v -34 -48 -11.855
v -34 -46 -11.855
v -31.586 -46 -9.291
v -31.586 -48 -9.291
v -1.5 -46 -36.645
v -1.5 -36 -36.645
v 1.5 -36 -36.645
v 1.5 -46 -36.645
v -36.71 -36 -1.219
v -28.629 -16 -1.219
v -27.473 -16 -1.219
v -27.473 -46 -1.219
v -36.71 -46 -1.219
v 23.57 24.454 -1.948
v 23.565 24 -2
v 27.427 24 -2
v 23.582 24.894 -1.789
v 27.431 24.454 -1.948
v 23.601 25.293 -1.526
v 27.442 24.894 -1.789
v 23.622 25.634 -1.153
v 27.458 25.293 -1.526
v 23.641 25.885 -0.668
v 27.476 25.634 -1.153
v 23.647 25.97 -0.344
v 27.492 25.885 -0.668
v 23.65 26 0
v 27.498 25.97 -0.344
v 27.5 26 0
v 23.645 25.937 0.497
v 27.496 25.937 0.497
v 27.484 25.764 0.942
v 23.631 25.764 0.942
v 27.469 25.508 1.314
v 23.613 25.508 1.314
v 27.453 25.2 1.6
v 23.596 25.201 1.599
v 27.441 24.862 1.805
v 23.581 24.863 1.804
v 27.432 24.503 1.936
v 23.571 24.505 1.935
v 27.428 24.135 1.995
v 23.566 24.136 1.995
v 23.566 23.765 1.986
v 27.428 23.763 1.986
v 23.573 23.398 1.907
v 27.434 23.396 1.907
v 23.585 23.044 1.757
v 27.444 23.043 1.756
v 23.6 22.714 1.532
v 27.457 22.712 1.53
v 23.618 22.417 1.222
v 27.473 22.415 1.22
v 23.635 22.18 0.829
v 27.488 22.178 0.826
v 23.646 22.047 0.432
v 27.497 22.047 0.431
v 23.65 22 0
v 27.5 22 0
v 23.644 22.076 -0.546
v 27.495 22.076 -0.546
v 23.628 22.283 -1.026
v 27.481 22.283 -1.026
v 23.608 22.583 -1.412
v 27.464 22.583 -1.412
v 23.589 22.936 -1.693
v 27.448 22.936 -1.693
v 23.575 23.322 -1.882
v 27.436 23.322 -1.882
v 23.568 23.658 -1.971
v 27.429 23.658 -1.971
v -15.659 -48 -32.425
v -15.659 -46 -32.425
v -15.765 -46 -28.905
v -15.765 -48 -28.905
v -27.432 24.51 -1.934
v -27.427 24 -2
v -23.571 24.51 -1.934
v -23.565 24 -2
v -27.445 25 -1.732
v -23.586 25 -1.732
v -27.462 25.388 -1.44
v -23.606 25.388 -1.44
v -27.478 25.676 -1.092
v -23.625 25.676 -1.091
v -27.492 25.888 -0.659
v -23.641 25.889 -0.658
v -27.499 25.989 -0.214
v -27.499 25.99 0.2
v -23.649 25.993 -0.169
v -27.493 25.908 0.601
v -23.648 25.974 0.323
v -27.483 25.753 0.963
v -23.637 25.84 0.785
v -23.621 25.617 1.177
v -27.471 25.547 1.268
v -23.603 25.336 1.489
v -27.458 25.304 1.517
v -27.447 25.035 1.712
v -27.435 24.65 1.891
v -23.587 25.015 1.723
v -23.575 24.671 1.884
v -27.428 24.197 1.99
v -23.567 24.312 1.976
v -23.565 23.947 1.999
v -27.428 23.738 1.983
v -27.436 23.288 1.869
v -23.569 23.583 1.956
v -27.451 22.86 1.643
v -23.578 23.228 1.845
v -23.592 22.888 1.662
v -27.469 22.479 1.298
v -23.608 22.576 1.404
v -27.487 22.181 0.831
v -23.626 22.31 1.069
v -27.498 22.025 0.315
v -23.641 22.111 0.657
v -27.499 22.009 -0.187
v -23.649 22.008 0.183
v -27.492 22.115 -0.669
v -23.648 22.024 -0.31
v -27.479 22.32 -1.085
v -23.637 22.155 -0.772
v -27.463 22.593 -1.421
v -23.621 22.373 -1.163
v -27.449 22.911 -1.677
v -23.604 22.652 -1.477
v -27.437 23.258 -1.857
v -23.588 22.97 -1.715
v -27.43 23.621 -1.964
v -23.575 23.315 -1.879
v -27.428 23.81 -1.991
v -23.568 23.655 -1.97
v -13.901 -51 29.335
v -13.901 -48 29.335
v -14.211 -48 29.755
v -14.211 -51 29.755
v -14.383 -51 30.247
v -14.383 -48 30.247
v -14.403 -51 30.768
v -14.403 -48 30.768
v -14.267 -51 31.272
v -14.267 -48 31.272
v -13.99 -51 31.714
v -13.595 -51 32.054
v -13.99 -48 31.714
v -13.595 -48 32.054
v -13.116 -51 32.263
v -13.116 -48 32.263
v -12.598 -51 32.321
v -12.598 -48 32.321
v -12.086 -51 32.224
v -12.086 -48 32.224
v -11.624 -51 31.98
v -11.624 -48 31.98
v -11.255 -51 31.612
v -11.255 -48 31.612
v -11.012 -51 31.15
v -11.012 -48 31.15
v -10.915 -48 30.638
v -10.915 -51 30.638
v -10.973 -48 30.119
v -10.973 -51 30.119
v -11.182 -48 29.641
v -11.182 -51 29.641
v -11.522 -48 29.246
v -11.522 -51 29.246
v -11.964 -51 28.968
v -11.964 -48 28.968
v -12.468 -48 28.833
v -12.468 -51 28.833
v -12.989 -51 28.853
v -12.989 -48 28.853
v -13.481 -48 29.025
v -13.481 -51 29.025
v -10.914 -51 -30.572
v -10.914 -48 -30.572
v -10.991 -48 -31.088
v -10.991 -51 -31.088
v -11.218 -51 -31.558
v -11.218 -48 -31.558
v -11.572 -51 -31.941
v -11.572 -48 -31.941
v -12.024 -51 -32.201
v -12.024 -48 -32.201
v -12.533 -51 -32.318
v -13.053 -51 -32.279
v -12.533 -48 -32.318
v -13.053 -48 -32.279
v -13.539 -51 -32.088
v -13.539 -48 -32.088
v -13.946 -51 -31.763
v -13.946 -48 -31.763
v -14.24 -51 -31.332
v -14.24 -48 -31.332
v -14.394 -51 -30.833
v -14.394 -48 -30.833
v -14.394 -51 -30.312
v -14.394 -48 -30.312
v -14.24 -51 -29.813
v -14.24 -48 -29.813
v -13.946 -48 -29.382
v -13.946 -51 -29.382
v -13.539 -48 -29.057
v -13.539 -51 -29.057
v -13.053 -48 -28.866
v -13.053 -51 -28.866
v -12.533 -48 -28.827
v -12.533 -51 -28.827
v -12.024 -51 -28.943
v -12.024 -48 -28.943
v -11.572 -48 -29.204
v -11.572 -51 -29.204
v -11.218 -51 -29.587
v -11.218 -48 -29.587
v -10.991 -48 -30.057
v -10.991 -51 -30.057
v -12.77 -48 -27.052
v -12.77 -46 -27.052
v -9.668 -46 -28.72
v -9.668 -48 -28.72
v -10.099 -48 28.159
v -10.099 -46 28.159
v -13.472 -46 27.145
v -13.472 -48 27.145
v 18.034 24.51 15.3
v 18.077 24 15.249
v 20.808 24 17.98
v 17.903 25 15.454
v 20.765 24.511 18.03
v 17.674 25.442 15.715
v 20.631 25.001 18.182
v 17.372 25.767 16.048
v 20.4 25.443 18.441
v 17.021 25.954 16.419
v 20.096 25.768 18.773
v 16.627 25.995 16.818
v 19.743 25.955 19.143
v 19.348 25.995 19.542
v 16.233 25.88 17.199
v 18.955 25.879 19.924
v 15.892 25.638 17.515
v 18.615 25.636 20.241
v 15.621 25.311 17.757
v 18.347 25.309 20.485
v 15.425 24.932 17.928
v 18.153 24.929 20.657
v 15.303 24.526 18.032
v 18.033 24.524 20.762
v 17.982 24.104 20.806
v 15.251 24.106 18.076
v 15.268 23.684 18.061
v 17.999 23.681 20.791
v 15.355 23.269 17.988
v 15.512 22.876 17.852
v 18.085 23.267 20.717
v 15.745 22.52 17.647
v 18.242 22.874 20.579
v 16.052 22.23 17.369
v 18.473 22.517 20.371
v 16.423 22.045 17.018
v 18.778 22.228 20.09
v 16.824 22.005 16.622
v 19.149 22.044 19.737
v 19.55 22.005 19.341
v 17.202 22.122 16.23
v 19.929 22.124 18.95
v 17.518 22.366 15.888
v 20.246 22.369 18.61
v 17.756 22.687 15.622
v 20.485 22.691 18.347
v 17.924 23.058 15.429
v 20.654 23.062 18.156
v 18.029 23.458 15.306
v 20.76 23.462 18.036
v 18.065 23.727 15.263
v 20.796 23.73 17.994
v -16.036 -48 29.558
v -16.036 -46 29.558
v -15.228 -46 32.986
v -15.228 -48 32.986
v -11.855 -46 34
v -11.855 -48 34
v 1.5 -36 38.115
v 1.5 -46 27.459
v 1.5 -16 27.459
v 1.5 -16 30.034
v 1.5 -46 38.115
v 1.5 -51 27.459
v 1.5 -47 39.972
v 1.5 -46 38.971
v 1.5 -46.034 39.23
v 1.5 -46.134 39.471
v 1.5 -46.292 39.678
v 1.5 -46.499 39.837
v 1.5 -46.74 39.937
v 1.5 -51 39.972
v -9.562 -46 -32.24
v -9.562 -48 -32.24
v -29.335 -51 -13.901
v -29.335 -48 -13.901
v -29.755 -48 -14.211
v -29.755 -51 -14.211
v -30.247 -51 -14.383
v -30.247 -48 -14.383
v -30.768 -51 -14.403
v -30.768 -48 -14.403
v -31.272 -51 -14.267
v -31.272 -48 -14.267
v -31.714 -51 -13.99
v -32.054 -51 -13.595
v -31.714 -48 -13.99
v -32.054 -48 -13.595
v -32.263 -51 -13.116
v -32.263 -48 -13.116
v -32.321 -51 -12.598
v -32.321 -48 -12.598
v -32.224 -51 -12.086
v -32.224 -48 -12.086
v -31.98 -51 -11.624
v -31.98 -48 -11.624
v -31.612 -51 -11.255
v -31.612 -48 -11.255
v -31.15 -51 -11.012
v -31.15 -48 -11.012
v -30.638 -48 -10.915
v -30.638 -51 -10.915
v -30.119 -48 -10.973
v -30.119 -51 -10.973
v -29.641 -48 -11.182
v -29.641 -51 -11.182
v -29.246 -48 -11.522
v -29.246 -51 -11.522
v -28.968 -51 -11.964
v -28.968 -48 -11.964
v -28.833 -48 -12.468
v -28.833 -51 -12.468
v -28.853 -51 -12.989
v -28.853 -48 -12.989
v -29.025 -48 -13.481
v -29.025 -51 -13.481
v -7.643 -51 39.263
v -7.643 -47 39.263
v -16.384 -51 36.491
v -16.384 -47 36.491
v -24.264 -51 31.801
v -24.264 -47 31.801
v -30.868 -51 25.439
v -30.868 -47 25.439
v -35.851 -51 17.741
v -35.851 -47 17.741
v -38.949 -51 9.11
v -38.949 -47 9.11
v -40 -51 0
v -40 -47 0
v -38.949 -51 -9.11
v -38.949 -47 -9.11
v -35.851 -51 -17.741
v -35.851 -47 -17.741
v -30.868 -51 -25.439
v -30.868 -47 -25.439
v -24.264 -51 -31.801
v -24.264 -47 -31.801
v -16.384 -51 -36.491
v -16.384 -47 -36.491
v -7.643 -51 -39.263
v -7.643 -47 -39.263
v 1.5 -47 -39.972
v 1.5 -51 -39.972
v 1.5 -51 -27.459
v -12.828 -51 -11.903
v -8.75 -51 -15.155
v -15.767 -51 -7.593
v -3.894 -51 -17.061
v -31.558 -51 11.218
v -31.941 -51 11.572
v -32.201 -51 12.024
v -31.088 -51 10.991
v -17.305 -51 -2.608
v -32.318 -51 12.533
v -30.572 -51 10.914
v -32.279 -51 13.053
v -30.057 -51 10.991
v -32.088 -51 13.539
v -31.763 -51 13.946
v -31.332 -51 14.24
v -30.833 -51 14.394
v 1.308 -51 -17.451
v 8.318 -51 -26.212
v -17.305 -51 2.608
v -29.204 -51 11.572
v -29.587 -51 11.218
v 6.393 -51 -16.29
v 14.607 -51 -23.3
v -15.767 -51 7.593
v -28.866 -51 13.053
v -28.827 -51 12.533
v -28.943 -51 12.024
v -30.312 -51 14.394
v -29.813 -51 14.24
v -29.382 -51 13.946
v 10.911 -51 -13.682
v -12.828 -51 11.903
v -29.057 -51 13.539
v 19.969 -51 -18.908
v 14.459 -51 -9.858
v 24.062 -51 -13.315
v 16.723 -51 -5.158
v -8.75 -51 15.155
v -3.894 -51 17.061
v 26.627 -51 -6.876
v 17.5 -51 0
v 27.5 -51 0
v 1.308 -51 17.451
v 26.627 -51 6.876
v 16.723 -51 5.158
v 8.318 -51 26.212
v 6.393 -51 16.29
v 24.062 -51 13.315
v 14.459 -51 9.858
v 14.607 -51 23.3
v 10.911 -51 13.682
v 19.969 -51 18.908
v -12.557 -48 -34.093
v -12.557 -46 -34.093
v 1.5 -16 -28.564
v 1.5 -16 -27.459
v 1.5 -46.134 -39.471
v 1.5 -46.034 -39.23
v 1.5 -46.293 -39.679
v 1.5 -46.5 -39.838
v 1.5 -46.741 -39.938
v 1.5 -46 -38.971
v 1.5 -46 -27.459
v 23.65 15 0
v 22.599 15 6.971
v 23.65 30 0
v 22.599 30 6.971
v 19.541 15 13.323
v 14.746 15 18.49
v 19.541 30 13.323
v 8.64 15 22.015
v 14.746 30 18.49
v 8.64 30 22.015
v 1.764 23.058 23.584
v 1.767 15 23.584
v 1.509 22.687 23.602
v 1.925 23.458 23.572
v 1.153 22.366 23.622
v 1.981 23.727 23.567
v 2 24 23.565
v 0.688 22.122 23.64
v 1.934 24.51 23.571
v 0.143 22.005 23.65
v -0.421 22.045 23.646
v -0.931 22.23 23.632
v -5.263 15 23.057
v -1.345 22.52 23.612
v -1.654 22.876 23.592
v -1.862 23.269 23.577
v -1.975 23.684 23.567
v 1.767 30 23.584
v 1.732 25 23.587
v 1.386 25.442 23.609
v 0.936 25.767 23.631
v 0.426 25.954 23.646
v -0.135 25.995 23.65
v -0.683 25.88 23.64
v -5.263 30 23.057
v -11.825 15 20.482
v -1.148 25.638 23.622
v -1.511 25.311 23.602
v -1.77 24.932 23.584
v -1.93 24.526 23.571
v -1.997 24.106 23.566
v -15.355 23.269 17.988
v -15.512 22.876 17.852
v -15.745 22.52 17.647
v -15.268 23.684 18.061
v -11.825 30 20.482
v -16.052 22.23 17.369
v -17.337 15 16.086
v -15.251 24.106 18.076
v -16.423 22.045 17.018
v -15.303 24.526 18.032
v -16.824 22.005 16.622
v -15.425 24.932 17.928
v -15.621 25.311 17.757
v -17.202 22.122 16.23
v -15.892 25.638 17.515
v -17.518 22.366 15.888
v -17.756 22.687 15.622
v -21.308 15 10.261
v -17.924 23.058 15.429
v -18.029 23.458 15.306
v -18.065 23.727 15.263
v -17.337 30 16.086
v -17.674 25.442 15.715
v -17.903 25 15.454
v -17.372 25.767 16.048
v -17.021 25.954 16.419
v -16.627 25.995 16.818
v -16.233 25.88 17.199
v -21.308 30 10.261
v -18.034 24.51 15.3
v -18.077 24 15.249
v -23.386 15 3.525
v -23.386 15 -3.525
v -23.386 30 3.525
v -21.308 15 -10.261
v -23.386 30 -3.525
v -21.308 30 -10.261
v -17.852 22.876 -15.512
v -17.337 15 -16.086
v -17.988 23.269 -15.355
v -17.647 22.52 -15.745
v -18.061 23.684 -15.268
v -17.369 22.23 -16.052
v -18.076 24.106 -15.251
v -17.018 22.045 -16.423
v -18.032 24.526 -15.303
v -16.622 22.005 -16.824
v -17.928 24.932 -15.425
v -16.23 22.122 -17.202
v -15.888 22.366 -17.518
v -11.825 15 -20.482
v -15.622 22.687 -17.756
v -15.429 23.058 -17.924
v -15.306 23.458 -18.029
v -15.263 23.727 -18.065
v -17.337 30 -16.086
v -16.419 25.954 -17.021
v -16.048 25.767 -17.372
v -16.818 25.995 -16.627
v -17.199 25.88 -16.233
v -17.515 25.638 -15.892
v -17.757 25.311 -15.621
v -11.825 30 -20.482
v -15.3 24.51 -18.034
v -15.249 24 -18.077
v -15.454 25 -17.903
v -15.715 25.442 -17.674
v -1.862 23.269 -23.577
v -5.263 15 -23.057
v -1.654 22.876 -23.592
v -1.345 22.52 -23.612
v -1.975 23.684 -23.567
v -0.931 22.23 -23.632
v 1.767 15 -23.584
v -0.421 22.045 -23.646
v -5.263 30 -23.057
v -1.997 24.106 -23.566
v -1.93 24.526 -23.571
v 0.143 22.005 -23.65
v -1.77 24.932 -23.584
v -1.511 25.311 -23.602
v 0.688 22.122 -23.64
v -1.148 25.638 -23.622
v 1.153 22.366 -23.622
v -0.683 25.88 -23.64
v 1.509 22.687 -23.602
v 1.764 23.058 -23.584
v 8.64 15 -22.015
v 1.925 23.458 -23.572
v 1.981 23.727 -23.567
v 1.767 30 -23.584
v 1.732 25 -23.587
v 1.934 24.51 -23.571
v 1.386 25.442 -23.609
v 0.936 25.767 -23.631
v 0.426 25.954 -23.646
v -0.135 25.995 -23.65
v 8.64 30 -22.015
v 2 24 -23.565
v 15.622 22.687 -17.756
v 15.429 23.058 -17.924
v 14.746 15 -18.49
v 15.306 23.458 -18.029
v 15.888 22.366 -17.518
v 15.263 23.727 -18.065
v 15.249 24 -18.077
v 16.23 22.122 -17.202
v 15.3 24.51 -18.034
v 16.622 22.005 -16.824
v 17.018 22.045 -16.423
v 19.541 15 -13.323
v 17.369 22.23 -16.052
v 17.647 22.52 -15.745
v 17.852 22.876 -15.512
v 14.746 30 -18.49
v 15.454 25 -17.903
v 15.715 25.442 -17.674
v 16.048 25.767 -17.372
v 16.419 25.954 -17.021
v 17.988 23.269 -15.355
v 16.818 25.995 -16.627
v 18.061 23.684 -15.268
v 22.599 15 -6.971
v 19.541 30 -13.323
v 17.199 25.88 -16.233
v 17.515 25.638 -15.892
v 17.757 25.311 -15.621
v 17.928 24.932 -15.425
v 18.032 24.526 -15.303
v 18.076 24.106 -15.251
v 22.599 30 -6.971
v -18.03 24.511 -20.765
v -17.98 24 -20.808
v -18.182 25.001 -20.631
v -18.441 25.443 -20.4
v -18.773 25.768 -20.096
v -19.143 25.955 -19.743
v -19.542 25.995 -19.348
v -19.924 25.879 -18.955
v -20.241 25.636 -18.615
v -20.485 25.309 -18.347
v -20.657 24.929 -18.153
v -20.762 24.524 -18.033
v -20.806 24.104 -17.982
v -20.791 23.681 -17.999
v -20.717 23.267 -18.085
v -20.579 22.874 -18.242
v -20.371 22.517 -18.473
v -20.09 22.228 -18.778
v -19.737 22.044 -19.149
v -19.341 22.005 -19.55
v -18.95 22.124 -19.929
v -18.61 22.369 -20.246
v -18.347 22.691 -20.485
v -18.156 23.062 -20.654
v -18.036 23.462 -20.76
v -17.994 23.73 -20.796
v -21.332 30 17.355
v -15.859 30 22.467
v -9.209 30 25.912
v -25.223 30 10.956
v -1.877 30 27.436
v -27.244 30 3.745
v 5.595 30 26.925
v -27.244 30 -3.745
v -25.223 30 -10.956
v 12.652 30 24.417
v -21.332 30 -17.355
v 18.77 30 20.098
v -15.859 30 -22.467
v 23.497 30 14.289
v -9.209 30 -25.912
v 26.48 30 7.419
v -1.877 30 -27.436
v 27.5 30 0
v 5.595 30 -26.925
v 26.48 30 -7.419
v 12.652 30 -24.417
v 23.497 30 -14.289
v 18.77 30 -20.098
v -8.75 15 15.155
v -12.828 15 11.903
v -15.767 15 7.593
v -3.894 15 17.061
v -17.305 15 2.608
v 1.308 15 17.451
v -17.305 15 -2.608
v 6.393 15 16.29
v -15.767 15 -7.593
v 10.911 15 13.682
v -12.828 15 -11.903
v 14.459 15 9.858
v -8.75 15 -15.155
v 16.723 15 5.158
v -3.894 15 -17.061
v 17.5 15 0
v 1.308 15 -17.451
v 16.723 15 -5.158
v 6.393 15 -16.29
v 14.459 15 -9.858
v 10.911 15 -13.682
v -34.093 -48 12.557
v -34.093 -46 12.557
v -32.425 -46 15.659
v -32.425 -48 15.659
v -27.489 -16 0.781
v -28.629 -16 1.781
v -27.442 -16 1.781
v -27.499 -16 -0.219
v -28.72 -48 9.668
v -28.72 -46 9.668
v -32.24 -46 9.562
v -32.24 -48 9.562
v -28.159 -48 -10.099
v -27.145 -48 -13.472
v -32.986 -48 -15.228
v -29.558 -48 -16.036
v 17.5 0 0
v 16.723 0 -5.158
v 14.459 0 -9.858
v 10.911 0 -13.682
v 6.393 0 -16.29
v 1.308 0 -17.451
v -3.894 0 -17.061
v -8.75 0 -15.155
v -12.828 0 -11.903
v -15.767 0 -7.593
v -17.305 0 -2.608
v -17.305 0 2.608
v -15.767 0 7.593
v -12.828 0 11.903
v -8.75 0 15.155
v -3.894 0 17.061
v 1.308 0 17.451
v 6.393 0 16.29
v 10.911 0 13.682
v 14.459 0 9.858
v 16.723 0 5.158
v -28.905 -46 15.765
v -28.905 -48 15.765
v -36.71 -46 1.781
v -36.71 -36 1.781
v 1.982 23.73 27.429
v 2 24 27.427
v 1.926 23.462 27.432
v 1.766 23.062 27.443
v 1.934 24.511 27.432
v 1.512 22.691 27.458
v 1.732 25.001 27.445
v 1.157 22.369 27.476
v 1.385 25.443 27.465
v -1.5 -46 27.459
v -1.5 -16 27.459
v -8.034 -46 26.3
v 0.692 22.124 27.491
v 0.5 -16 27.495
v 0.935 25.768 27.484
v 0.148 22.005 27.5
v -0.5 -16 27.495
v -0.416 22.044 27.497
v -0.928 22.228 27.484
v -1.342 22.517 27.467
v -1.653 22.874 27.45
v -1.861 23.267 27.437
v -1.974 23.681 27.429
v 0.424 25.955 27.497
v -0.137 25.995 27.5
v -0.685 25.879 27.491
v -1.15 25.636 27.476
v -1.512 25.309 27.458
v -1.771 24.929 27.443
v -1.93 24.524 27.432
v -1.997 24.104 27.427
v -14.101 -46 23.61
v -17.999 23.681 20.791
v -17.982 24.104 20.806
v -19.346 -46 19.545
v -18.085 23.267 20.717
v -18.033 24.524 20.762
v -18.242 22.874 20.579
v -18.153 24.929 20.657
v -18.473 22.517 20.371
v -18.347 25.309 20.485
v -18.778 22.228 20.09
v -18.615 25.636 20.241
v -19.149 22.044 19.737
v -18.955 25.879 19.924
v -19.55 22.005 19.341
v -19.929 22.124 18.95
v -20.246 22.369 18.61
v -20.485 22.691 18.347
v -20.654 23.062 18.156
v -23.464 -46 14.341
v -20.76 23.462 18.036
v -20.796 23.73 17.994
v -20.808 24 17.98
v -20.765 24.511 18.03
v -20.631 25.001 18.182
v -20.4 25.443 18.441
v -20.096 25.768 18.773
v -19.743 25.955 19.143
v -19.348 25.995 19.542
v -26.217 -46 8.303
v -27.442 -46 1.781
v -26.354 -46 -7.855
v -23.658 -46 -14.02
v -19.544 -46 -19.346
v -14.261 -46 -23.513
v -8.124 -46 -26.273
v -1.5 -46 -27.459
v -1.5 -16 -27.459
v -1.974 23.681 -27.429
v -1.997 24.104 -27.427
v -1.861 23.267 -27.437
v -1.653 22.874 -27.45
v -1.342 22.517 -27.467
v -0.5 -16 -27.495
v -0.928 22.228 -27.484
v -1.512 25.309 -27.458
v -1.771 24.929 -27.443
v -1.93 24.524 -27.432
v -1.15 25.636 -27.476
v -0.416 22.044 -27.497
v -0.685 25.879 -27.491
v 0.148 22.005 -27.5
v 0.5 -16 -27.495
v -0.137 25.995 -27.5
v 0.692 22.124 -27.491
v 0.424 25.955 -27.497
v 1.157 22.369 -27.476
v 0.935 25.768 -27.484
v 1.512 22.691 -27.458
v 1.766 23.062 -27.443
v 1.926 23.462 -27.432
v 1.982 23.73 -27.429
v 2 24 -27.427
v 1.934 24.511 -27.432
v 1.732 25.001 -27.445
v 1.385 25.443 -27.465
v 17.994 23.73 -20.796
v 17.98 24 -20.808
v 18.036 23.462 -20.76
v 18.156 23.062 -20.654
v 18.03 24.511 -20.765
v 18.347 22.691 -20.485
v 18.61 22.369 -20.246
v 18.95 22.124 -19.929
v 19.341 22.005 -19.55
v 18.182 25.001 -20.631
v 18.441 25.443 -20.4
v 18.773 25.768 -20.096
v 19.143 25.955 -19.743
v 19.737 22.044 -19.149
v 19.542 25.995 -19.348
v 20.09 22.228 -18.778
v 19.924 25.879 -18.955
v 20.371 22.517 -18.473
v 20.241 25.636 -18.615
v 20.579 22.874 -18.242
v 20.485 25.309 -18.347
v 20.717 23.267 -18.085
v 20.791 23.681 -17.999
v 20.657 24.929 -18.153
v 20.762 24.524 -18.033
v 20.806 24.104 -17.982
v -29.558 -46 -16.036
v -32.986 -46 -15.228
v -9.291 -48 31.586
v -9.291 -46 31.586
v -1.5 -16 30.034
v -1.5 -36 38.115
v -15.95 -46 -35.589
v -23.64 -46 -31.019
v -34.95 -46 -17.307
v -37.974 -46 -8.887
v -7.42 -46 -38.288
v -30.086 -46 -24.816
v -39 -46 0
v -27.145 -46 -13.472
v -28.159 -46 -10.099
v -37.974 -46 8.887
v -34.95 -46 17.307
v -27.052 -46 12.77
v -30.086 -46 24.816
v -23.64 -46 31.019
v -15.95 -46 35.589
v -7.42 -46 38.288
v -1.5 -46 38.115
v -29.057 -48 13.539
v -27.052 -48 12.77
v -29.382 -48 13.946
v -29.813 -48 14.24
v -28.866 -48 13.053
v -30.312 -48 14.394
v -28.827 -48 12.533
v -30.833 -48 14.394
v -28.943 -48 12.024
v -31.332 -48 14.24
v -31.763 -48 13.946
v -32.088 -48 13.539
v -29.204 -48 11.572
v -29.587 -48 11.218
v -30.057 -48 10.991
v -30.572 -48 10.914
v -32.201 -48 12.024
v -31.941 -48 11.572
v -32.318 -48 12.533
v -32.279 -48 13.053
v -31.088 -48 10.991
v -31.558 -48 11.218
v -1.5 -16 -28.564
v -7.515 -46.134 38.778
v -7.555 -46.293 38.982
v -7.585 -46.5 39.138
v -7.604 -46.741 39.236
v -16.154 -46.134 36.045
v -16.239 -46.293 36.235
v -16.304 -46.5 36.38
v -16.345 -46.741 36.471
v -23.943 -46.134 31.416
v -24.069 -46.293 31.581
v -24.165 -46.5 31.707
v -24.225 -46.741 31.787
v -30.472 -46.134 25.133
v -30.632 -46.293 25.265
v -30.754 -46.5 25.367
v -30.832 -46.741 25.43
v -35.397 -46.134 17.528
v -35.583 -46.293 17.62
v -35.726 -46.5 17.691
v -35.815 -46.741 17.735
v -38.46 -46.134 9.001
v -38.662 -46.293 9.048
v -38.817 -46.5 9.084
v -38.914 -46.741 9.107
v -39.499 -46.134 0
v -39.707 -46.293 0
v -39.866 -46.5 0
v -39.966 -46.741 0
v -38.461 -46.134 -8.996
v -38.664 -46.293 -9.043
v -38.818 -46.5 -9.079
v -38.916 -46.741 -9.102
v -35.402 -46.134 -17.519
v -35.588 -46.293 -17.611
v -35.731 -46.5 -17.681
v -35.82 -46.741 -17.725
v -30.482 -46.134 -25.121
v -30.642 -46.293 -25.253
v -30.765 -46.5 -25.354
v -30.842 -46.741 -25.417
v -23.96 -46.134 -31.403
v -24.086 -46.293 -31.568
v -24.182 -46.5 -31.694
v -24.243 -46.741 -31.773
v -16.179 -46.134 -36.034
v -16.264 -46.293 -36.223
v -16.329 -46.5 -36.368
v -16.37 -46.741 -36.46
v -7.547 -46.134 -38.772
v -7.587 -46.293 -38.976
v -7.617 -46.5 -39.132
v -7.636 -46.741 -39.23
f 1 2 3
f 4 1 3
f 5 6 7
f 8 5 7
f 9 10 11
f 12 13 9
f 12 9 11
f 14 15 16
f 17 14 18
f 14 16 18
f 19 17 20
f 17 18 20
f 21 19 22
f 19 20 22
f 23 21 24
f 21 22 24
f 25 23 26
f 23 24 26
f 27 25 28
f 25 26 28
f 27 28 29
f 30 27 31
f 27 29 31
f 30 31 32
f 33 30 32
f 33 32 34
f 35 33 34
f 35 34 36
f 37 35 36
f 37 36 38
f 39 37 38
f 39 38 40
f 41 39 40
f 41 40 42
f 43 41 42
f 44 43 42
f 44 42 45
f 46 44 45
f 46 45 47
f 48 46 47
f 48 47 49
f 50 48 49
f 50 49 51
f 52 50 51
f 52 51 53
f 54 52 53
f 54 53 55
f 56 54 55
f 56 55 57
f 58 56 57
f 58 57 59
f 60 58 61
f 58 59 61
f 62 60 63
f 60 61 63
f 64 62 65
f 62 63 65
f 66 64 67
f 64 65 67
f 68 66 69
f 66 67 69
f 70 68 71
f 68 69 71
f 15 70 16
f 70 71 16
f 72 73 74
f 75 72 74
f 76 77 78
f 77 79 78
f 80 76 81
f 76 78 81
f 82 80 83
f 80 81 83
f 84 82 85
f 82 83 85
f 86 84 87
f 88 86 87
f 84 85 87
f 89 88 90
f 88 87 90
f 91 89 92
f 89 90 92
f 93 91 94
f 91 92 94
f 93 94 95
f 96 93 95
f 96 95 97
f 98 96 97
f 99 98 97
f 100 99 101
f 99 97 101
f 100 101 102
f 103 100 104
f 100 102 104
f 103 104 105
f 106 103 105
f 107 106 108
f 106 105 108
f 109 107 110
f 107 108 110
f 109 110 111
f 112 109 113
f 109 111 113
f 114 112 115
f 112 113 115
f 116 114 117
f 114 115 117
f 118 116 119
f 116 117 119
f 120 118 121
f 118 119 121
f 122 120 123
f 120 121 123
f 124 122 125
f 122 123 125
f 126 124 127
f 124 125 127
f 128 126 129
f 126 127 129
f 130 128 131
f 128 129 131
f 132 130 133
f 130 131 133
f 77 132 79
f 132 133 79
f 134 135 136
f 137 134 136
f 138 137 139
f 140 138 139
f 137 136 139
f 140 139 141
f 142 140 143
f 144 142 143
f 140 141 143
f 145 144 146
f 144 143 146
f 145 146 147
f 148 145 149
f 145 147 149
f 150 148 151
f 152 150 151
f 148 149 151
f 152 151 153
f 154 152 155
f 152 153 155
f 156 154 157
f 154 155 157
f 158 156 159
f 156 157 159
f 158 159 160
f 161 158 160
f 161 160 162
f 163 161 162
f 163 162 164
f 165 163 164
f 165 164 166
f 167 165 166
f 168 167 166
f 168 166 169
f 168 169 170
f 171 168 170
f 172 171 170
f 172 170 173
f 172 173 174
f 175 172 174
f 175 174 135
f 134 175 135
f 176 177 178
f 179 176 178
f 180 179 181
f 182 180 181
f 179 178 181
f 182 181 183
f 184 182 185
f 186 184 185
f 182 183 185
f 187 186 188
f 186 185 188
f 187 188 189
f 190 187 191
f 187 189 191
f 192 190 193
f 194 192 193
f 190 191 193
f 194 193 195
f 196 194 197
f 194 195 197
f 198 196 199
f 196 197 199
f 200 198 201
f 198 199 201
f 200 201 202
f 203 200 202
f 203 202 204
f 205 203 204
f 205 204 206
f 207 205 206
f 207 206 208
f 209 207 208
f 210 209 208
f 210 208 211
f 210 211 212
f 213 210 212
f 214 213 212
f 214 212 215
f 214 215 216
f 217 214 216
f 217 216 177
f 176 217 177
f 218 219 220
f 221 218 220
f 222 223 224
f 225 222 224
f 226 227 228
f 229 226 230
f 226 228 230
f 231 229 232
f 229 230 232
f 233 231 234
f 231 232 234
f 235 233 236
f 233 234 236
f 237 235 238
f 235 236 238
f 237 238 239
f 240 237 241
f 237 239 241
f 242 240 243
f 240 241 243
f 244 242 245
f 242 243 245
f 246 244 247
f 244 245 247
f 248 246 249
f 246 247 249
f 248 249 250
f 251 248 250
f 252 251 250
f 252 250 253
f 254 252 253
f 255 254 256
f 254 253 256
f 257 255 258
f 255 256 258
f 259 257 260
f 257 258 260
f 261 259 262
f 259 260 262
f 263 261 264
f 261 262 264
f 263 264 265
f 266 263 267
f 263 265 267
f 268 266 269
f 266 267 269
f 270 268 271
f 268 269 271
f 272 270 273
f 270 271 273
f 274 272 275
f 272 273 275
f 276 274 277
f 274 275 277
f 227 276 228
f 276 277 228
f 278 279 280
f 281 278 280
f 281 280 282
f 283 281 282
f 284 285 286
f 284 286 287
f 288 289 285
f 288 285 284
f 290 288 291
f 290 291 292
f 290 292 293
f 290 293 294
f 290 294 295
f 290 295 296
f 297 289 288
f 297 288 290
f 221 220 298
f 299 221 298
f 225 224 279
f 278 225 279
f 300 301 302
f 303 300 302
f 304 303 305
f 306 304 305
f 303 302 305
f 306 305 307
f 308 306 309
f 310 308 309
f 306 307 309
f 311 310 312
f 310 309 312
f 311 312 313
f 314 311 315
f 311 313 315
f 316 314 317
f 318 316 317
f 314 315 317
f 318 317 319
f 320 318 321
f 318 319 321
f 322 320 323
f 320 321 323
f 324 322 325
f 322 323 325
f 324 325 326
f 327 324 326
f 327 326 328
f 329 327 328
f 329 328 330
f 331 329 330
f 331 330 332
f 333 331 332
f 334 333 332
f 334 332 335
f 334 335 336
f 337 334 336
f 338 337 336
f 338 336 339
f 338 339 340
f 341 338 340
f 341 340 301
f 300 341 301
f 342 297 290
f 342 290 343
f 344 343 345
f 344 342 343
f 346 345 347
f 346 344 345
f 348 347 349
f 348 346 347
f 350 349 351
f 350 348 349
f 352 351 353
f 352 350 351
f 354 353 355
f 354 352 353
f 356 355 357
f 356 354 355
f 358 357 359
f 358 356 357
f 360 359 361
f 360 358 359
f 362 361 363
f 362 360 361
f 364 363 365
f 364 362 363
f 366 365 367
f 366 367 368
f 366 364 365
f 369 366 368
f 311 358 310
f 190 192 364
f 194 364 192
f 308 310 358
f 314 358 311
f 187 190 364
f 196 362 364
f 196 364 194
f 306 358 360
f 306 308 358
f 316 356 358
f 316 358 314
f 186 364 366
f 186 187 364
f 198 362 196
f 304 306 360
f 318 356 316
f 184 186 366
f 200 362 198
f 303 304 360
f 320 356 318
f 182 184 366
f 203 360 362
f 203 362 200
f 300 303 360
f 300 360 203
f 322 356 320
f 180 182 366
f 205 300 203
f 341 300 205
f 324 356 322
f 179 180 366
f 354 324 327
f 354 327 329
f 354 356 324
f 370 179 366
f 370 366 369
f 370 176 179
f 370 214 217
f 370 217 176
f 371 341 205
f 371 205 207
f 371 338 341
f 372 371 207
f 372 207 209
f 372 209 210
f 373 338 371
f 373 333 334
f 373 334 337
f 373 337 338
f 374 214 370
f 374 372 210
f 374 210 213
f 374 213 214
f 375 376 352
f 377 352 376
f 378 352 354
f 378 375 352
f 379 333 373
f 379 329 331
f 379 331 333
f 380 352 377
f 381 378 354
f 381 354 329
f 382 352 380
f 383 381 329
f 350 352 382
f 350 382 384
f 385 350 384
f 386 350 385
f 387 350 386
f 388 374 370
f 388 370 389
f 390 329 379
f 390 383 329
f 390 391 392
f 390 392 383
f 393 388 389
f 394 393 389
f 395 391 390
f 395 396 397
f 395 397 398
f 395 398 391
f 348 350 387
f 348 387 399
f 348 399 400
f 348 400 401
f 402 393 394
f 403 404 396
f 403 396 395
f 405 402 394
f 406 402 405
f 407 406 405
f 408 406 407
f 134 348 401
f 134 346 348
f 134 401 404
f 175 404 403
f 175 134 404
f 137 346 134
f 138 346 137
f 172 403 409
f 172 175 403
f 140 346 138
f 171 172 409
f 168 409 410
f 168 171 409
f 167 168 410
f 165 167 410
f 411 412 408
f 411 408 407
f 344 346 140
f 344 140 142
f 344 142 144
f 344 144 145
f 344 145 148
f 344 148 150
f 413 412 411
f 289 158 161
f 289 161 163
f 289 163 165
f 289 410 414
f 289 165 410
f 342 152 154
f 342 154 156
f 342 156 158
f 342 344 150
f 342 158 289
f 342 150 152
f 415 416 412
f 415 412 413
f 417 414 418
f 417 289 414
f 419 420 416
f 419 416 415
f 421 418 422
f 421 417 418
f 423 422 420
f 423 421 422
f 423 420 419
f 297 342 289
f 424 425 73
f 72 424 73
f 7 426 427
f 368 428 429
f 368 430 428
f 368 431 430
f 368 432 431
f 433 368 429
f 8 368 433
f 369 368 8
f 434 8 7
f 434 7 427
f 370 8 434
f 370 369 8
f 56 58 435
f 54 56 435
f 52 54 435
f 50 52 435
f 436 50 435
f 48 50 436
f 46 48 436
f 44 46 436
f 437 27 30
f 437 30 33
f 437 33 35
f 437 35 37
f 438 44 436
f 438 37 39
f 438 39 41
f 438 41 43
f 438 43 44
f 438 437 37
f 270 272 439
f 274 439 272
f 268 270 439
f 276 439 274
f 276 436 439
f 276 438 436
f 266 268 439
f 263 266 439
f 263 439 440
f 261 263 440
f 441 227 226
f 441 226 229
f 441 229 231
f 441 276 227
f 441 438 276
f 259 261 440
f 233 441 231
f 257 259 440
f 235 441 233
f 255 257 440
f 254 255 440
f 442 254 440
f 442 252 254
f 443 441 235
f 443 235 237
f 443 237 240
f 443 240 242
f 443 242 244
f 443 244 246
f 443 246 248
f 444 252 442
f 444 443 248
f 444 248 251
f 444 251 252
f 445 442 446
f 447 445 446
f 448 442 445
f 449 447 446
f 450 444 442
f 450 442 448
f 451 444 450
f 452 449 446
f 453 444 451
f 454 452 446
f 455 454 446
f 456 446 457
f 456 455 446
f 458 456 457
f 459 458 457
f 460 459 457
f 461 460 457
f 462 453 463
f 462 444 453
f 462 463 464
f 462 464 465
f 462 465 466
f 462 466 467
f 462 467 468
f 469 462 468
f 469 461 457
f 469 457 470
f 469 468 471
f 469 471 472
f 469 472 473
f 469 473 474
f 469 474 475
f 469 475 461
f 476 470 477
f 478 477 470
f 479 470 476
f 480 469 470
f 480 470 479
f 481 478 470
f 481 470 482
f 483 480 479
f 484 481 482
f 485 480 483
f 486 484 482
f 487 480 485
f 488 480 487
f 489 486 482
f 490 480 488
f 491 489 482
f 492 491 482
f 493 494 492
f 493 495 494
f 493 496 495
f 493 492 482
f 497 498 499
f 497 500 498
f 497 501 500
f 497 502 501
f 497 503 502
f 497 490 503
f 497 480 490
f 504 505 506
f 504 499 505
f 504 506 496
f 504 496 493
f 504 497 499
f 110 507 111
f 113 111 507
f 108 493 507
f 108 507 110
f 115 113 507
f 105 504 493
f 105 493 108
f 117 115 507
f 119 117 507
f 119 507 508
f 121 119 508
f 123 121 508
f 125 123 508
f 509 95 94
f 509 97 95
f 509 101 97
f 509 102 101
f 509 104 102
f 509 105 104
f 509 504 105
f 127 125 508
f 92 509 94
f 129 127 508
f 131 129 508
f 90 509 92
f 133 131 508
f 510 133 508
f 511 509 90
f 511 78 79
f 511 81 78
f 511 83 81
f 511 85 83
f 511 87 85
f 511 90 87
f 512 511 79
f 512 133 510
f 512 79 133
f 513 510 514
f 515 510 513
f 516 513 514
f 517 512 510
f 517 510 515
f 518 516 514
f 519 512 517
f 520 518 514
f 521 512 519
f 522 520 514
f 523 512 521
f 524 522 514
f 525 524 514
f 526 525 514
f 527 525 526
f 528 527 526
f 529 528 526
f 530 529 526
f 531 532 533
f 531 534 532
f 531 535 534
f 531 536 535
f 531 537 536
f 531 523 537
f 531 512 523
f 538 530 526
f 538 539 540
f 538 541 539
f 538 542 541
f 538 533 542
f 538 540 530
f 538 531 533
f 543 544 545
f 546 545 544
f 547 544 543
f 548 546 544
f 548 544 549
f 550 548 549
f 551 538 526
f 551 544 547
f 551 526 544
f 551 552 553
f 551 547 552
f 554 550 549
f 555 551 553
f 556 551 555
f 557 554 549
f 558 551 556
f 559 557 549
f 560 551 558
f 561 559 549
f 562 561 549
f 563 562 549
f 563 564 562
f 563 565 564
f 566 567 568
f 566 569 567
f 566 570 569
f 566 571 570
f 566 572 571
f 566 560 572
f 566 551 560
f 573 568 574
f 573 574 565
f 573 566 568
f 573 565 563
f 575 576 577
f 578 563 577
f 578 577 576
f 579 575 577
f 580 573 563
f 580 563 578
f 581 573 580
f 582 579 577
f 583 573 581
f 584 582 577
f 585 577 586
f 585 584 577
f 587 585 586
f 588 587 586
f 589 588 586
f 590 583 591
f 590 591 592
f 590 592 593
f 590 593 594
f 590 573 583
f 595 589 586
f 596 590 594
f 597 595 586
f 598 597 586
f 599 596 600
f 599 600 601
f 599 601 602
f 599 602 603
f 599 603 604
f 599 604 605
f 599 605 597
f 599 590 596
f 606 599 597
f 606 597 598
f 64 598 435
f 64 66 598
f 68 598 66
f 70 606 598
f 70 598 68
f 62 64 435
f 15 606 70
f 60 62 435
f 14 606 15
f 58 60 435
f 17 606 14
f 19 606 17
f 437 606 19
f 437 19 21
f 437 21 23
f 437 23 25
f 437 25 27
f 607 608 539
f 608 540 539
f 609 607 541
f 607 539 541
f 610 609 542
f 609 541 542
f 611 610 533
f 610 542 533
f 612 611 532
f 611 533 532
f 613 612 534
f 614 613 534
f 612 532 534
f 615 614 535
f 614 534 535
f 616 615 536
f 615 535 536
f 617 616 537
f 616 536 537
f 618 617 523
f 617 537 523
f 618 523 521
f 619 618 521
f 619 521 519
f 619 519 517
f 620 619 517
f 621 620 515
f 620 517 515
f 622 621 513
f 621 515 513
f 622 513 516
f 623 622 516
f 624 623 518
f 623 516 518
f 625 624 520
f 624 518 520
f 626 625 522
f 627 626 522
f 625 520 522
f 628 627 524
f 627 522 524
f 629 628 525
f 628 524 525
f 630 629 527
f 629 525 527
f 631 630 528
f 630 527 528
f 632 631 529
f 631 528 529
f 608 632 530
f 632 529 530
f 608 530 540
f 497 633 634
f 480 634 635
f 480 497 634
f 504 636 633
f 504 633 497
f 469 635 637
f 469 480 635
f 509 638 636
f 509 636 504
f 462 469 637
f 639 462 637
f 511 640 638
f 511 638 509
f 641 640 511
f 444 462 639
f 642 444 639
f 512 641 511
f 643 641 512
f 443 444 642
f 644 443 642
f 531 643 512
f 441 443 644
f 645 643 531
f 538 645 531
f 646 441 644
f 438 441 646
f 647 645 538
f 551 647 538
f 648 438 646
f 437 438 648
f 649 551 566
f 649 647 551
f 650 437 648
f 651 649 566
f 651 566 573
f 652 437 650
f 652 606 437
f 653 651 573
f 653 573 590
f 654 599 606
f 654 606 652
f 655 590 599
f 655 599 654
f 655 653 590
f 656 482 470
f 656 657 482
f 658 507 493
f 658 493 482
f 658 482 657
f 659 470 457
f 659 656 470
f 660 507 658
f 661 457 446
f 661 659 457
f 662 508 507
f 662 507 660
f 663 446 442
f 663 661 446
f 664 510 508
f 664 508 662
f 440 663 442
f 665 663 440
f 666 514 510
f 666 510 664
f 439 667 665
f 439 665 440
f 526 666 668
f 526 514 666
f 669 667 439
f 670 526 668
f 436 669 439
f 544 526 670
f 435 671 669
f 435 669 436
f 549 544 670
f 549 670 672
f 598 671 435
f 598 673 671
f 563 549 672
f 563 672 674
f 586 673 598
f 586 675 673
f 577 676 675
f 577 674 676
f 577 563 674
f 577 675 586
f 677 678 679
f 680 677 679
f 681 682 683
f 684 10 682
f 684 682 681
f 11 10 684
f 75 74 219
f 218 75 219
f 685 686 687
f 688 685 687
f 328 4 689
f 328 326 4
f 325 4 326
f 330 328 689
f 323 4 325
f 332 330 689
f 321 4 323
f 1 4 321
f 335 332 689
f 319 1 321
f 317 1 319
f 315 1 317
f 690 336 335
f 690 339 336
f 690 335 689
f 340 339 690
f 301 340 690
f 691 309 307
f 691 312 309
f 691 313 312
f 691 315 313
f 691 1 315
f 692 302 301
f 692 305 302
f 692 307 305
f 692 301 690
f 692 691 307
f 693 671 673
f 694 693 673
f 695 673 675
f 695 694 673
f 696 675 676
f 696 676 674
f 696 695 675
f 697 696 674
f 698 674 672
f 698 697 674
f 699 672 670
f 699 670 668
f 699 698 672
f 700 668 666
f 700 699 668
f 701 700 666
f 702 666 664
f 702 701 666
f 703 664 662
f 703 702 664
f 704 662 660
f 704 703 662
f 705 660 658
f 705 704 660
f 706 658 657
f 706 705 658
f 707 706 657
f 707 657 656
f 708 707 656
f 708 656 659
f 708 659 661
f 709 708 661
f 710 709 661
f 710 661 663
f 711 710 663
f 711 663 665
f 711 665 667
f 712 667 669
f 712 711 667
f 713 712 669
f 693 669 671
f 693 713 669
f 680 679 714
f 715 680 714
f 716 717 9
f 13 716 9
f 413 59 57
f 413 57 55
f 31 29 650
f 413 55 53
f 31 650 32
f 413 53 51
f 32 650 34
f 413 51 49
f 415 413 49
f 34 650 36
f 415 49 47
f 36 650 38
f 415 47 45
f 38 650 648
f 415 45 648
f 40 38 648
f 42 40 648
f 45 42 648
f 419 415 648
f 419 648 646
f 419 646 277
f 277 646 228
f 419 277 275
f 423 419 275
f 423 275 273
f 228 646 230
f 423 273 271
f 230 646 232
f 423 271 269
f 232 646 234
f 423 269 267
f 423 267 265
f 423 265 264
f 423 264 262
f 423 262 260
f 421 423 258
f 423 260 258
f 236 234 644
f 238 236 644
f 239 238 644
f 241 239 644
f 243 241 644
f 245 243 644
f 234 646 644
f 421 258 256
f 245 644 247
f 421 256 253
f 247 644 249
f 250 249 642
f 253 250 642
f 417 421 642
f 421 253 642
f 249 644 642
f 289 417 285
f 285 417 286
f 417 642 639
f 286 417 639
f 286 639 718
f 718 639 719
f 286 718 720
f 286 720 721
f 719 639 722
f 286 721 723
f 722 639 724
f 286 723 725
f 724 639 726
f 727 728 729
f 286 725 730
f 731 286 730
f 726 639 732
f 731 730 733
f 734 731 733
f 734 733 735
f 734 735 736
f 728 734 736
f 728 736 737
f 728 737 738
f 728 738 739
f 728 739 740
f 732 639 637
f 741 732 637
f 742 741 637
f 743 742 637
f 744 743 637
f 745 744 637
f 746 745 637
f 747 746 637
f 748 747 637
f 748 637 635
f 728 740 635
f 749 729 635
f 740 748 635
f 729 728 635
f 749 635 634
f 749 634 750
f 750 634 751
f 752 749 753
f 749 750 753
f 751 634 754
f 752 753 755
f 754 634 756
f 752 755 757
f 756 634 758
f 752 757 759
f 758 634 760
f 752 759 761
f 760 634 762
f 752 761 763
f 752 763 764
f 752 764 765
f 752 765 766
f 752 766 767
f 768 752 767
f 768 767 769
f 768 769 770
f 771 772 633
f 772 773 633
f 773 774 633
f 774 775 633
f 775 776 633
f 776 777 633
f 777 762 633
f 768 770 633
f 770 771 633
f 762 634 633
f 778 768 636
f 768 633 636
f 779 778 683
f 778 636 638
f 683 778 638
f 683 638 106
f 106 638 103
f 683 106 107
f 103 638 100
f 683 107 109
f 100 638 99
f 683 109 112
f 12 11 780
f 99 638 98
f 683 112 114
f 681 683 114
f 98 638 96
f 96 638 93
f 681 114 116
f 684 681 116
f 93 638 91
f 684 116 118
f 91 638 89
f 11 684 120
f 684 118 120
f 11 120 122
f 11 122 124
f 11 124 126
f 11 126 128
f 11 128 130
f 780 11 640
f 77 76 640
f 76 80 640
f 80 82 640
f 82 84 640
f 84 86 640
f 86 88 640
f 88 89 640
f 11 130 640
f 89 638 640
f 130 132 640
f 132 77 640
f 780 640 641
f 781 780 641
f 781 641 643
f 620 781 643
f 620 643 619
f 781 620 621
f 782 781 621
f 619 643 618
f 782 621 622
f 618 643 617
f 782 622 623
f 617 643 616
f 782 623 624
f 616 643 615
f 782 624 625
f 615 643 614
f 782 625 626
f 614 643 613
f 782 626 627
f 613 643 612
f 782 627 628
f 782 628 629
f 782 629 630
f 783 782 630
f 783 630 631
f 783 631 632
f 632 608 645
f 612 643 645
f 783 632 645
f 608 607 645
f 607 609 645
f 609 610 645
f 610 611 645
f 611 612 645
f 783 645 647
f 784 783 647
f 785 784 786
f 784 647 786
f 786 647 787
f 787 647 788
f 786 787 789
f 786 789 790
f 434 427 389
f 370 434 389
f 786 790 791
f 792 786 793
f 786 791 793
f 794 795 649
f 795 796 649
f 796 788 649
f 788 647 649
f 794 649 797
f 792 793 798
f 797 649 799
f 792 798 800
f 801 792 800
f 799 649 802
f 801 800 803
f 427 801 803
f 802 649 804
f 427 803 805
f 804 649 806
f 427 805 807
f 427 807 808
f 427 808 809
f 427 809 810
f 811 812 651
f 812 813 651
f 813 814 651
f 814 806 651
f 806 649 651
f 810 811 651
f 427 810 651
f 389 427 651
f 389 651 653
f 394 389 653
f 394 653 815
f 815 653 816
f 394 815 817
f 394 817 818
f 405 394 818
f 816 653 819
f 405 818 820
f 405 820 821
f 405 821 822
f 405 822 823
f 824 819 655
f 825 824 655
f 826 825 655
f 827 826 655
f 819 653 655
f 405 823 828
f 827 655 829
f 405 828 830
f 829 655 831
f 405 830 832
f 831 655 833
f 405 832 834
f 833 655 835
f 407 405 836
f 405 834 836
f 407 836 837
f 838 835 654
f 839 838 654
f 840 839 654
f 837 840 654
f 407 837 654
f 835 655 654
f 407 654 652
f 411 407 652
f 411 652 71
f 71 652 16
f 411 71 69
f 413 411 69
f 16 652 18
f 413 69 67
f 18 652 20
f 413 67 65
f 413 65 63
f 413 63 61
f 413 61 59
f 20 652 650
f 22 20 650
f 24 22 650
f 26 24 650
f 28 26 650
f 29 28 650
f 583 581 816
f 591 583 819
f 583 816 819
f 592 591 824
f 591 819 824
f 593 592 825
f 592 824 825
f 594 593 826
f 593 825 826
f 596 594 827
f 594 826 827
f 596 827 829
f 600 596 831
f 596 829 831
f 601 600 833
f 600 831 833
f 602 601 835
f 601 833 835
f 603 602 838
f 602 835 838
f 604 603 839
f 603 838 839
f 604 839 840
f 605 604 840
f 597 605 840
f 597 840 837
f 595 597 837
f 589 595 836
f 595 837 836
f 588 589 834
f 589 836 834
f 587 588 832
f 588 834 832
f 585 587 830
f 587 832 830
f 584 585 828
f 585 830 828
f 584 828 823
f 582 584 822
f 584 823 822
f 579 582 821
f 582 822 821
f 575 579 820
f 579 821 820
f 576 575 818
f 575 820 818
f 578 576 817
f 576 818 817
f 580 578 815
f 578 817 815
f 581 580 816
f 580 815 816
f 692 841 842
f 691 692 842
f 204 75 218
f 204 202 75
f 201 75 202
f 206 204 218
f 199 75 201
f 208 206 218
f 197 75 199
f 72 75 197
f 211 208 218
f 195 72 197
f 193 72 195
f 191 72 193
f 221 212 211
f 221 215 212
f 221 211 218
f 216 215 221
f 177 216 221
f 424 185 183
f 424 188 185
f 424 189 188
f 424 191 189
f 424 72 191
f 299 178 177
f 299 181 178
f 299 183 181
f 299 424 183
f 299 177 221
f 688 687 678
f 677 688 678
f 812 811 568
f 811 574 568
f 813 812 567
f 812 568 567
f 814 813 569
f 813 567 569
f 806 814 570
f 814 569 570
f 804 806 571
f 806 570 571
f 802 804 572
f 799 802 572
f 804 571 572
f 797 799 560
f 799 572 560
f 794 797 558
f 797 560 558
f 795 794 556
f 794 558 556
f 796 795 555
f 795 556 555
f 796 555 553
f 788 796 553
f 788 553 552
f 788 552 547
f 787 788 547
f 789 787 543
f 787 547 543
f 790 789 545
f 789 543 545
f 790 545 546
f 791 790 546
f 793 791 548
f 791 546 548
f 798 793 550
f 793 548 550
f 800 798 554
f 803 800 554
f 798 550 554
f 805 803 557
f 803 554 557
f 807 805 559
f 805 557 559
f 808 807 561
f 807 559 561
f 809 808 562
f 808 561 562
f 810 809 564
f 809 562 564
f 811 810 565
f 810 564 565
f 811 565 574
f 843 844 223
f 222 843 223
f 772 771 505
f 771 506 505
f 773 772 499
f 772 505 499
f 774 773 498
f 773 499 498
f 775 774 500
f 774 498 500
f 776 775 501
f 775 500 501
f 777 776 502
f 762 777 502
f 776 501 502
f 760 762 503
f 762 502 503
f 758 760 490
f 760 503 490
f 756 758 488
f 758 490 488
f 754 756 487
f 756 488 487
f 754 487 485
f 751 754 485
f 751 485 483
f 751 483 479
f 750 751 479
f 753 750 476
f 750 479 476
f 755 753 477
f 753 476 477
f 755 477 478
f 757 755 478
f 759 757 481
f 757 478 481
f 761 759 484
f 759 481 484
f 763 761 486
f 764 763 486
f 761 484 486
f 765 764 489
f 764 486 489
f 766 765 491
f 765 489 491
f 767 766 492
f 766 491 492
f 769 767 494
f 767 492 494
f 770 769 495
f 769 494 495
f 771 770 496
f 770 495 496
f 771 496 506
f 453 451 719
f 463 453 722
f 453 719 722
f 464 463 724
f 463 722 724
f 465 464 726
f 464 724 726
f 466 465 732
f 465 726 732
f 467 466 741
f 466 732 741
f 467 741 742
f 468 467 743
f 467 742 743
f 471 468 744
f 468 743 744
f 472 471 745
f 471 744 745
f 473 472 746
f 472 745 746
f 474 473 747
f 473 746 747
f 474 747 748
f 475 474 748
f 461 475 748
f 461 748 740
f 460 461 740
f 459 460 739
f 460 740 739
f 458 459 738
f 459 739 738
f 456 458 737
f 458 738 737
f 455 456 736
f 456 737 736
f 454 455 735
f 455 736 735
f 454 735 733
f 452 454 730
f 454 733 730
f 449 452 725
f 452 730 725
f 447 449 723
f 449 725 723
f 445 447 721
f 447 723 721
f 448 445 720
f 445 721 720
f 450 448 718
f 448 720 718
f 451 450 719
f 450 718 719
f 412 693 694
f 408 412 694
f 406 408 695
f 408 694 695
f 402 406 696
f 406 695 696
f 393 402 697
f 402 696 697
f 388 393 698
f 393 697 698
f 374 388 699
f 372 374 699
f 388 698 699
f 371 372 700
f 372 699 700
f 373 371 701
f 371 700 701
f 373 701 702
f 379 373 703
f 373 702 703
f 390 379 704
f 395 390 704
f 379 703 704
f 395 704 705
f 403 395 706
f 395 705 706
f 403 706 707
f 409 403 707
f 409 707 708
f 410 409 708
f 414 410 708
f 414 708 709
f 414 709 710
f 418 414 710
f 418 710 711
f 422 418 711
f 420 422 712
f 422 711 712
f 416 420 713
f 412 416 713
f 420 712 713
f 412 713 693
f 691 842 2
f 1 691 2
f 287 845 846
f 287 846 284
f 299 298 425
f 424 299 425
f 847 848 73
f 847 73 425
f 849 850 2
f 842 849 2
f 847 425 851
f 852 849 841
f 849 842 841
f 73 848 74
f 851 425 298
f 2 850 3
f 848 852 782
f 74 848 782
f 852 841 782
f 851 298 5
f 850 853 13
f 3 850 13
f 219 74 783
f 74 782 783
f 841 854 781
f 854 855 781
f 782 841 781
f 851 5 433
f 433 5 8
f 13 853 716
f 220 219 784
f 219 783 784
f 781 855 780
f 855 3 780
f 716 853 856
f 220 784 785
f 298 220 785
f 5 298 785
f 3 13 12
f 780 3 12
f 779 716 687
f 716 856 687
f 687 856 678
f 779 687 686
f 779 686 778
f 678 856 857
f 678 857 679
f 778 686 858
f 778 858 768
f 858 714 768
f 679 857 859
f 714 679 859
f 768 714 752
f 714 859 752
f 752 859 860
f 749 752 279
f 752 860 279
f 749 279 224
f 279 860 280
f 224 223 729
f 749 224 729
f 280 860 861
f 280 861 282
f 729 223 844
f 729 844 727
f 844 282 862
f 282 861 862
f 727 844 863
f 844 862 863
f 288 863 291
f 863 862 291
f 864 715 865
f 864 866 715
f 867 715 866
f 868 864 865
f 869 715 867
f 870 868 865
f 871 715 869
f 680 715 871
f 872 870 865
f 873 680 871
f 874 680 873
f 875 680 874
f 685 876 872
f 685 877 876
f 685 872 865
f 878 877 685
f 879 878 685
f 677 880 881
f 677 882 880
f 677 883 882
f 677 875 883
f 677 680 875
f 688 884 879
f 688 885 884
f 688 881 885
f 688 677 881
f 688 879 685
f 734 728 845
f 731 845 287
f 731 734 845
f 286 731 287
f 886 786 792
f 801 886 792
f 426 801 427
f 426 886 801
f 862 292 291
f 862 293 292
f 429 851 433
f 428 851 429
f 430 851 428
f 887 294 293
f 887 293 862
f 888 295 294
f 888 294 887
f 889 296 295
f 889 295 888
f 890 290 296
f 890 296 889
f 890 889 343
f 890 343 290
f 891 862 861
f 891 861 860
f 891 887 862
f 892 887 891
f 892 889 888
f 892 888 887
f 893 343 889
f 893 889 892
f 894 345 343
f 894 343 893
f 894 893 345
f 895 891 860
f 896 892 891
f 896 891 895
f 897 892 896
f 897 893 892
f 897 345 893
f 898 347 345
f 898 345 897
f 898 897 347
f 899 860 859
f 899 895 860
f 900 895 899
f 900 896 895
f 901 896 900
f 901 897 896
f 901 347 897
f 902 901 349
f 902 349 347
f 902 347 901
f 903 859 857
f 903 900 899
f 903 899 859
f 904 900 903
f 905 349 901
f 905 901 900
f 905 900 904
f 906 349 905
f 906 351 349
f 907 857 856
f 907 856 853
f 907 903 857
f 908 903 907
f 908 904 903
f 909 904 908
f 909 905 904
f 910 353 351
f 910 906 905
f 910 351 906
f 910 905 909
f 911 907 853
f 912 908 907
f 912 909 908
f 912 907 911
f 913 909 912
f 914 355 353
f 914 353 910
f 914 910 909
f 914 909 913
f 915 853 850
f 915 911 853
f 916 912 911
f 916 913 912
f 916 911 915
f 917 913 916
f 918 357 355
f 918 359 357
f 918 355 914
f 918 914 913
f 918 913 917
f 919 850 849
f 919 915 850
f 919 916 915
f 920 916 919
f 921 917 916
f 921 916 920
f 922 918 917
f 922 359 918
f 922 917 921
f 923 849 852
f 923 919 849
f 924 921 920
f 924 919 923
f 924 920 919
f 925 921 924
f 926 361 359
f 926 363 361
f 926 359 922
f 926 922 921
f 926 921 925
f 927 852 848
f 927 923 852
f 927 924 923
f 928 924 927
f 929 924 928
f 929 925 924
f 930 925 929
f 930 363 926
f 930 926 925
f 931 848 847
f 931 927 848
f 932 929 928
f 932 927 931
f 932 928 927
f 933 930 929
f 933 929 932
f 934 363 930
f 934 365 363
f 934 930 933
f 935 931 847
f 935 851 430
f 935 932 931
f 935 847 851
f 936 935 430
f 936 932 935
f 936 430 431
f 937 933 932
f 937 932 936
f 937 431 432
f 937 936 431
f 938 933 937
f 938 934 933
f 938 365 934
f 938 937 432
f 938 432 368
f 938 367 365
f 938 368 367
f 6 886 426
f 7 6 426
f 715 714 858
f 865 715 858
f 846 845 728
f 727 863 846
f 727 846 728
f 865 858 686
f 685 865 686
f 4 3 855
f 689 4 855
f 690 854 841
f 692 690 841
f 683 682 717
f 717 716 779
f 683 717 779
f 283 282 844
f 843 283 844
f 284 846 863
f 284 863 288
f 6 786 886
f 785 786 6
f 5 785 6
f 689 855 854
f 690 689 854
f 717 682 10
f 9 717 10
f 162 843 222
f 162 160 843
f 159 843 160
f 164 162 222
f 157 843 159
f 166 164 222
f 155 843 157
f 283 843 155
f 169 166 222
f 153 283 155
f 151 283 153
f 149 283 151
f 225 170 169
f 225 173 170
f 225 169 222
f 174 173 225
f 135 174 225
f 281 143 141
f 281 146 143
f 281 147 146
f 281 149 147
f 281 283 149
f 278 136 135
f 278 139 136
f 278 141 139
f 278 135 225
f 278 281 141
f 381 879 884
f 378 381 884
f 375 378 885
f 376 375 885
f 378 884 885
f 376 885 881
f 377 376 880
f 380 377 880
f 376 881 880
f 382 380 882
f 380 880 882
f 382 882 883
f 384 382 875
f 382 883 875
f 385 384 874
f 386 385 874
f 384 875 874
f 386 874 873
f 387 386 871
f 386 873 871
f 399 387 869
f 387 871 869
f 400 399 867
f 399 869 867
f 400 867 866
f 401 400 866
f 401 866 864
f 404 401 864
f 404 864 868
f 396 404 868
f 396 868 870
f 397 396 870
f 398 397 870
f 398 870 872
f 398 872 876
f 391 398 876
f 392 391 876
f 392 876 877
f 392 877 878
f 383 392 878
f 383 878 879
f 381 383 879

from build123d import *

# Parameters (mm, degrees)
SKETCH1_R                = 27.5
SKETCH1_R_2              = 23.65
BOSS_EXTRUDE1_DEPTH      = 30
SKETCH2_R                = 2
CUT_EXTRUDE1_DEPTH       = 28.5
CIRPATTERN1_COUNT        = 4
CIRPATTERN1_ANGLE        = 135
SKETCH3_R                = 27.5
SKETCH3_R_2              = 23.65
BOSS_EXTRUDE2_DEPTH      = 51
BOSS_EXTRUDE3_DEPTH      = 5
SKETCH6_W                = 3
SKETCH6_H                = 12
SKETCH6_W_2              = 12
SKETCH6_H_2              = 3
BOSS_EXTRUDE4_DEPTH      = 30
CHAMFER1_SIZE            = 20
CHAMFER1_SIZE2           = 8.080524517
CHAMFER1_PART_2_SIZE     = 20
CHAMFER1_PART_2_SIZE2    = 8.080524517
CHAMFER1_PART_3_SIZE     = 20
CHAMFER1_PART_3_SIZE2    = 8.080524517
SKETCH7_R                = 1.75
CUT_EXTRUDE2_DEPTH       = 6.0000001
CUT_EXTRUDE3_DEPTH       = 2
CIRPATTERN2_COUNT        = 4
CIRPATTERN2_ANGLE        = 135
FILLET1_R                = 1
SKETCH9_R                = 26.233260483
SKETCH9_R_2              = 17.5
BOSS_EXTRUDE5_DEPTH      = 15
BOSS_EXTRUDE5_DEPTH_BACK = 51


with BuildPart() as part:
    # Sketch1 → Boss-Extrude1 (new body)
    with BuildSketch(Plane(origin=(0, 0, 0), x_dir=(1, 0, 0), z_dir=(0, 1, 0))):
        Circle(SKETCH1_R)
        Circle(SKETCH1_R_2, mode=Mode.SUBTRACT)
    extrude(amount=BOSS_EXTRUDE1_DEPTH)

    # Sketch2 → Cut-Extrude1 (cut, symmetric)
    with BuildSketch(Plane.XY):
        with Locations((0, 24)):
            Circle(SKETCH2_R)
    cut_extrude1 = extrude(amount=CUT_EXTRUDE1_DEPTH, both=True, mode=Mode.SUBTRACT)

    # CirPattern1: Cut-Extrude1 ×4 about axis
    cirpattern1_axis = Axis((0, 30, 0), (0, 1, 0))
    for i in range(1, CIRPATTERN1_COUNT):
        add(cut_extrude1.rotate(cirpattern1_axis, i * CIRPATTERN1_ANGLE / (CIRPATTERN1_COUNT - 1)), mode=Mode.SUBTRACT)

    # Sketch3 → Boss-Extrude2 (add)
    with BuildSketch(Plane.XZ):
        Circle(SKETCH3_R)
        Circle(SKETCH3_R_2, mode=Mode.SUBTRACT)
    extrude(amount=BOSS_EXTRUDE2_DEPTH)

    # Sketch4 → Boss-Extrude3 (add)
    with BuildSketch(Plane.XZ.offset(51)):
        with BuildLine():
            Line((1.5, 27.459060435), (1.5, 39.971865105))
            ThreePointArc((1.5, 39.971865105), (-40, 0), (1.5, -39.971865105))
            Line((1.5, -39.971865105), (1.5, -27.459060435))
            ThreePointArc((1.5, -27.459060435), (-27.5, 0), (1.5, 27.459060435))
        make_face()
    extrude(amount=-BOSS_EXTRUDE3_DEPTH)

    # Sketch6 → Boss-Extrude4 (add)
    with BuildSketch(Plane(origin=(0, -46, 0), x_dir=(1, 0, 0), z_dir=(0, 1, 0))):
        with Locations((0, 30.644528231)):
            Rectangle(SKETCH6_W, SKETCH6_H)
        with Locations((-30.709825096, -0.28052704)):
            Rectangle(SKETCH6_W_2, SKETCH6_H_2)
        with Locations((0, -32.114539573)):
            Rectangle(SKETCH6_W, SKETCH6_H)
    extrude(amount=BOSS_EXTRUDE4_DEPTH)

    # Chamfer1
    chamfer1_edges = [part.edges().sort_by_distance(p)[0] for p in [
        (0, -16, -36.644528231),
    ]]
    chamfer1_side = [part.faces().sort_by_distance(p)[0] for p in [
        (0, -31, -36.644528231),
    ]]
    chamfer(chamfer1_edges, length=CHAMFER1_SIZE, length2=CHAMFER1_SIZE2, reference=chamfer1_side[0])

    # Chamfer1 part 2
    chamfer1_part_2_edges = [part.edges().sort_by_distance(p)[0] for p in [
        (-36.709825096, -16, 0.28052704),
    ]]
    chamfer1_part_2_side = [part.faces().sort_by_distance(p)[0] for p in [
        (-36.709825096, -31, 0.28052704),
    ]]
    chamfer(chamfer1_part_2_edges, length=CHAMFER1_PART_2_SIZE, length2=CHAMFER1_PART_2_SIZE2, reference=chamfer1_part_2_side[0])

    # Chamfer1 part 3
    chamfer1_part_3_edges = [part.edges().sort_by_distance(p)[0] for p in [
        (0, -16, 38.114539573),
    ]]
    chamfer1_part_3_side = [part.faces().sort_by_distance(p)[0] for p in [
        (0, -31, 38.114539573),
    ]]
    chamfer(chamfer1_part_3_edges, length=CHAMFER1_PART_3_SIZE, length2=CHAMFER1_PART_3_SIZE2, reference=chamfer1_part_3_side[0])

    # Sketch7 → Cut-Extrude2 (cut, through all)
    with BuildSketch(Plane(origin=(0, -46, 0), x_dir=(1, 0, 0), z_dir=(0, 1, 0))):
        with Locations((-12.663510369, 30.572418481)):
            Circle(SKETCH7_R)
    cut_extrude2 = extrude(amount=-CUT_EXTRUDE2_DEPTH, mode=Mode.SUBTRACT)

    # Sketch8 → Cut-Extrude3 (cut)
    with BuildSketch(Plane(origin=(0, -46, 0), x_dir=(1, 0, 0), z_dir=(0, 1, 0))):
        Polygon((-9.561603451, 32.24020348), (-12.556901088, 34.092641172), (-15.658808006, 32.424856172), (-15.765417287, 28.904633481), (-12.770119651, 27.05219579), (-9.668212733, 28.719980789), align=None)
    cut_extrude3 = extrude(amount=-CUT_EXTRUDE3_DEPTH, mode=Mode.SUBTRACT)

    # CirPattern2: Cut-Extrude2, Cut-Extrude3 ×4 about axis
    cirpattern2_axis = Axis((0, 0, 0), (0, 1, 0))
    for i in range(1, CIRPATTERN2_COUNT):
        add(cut_extrude2.rotate(cirpattern2_axis, i * CIRPATTERN2_ANGLE / (CIRPATTERN2_COUNT - 1)), mode=Mode.SUBTRACT)
        add(cut_extrude3.rotate(cirpattern2_axis, i * CIRPATTERN2_ANGLE / (CIRPATTERN2_COUNT - 1)), mode=Mode.SUBTRACT)

    # Fillet1
    fillet1_edges = [part.edges().sort_by_distance(p)[0] for p in [
        (-40, -46, 0),
    ]]
    fillet(fillet1_edges, radius=FILLET1_R)

    # Sketch9 → Boss-Extrude5 (add, two sides)
    with BuildSketch(Plane(origin=(0, 0, 0), x_dir=(1, 0, 0), z_dir=(0, 1, 0))) as boss_extrude5_sk:
        Circle(SKETCH9_R)
        Circle(SKETCH9_R_2, mode=Mode.SUBTRACT)
    extrude(amount=BOSS_EXTRUDE5_DEPTH)
    extrude(boss_extrude5_sk.sketch, amount=-BOSS_EXTRUDE5_DEPTH_BACK)


solid = part.part
